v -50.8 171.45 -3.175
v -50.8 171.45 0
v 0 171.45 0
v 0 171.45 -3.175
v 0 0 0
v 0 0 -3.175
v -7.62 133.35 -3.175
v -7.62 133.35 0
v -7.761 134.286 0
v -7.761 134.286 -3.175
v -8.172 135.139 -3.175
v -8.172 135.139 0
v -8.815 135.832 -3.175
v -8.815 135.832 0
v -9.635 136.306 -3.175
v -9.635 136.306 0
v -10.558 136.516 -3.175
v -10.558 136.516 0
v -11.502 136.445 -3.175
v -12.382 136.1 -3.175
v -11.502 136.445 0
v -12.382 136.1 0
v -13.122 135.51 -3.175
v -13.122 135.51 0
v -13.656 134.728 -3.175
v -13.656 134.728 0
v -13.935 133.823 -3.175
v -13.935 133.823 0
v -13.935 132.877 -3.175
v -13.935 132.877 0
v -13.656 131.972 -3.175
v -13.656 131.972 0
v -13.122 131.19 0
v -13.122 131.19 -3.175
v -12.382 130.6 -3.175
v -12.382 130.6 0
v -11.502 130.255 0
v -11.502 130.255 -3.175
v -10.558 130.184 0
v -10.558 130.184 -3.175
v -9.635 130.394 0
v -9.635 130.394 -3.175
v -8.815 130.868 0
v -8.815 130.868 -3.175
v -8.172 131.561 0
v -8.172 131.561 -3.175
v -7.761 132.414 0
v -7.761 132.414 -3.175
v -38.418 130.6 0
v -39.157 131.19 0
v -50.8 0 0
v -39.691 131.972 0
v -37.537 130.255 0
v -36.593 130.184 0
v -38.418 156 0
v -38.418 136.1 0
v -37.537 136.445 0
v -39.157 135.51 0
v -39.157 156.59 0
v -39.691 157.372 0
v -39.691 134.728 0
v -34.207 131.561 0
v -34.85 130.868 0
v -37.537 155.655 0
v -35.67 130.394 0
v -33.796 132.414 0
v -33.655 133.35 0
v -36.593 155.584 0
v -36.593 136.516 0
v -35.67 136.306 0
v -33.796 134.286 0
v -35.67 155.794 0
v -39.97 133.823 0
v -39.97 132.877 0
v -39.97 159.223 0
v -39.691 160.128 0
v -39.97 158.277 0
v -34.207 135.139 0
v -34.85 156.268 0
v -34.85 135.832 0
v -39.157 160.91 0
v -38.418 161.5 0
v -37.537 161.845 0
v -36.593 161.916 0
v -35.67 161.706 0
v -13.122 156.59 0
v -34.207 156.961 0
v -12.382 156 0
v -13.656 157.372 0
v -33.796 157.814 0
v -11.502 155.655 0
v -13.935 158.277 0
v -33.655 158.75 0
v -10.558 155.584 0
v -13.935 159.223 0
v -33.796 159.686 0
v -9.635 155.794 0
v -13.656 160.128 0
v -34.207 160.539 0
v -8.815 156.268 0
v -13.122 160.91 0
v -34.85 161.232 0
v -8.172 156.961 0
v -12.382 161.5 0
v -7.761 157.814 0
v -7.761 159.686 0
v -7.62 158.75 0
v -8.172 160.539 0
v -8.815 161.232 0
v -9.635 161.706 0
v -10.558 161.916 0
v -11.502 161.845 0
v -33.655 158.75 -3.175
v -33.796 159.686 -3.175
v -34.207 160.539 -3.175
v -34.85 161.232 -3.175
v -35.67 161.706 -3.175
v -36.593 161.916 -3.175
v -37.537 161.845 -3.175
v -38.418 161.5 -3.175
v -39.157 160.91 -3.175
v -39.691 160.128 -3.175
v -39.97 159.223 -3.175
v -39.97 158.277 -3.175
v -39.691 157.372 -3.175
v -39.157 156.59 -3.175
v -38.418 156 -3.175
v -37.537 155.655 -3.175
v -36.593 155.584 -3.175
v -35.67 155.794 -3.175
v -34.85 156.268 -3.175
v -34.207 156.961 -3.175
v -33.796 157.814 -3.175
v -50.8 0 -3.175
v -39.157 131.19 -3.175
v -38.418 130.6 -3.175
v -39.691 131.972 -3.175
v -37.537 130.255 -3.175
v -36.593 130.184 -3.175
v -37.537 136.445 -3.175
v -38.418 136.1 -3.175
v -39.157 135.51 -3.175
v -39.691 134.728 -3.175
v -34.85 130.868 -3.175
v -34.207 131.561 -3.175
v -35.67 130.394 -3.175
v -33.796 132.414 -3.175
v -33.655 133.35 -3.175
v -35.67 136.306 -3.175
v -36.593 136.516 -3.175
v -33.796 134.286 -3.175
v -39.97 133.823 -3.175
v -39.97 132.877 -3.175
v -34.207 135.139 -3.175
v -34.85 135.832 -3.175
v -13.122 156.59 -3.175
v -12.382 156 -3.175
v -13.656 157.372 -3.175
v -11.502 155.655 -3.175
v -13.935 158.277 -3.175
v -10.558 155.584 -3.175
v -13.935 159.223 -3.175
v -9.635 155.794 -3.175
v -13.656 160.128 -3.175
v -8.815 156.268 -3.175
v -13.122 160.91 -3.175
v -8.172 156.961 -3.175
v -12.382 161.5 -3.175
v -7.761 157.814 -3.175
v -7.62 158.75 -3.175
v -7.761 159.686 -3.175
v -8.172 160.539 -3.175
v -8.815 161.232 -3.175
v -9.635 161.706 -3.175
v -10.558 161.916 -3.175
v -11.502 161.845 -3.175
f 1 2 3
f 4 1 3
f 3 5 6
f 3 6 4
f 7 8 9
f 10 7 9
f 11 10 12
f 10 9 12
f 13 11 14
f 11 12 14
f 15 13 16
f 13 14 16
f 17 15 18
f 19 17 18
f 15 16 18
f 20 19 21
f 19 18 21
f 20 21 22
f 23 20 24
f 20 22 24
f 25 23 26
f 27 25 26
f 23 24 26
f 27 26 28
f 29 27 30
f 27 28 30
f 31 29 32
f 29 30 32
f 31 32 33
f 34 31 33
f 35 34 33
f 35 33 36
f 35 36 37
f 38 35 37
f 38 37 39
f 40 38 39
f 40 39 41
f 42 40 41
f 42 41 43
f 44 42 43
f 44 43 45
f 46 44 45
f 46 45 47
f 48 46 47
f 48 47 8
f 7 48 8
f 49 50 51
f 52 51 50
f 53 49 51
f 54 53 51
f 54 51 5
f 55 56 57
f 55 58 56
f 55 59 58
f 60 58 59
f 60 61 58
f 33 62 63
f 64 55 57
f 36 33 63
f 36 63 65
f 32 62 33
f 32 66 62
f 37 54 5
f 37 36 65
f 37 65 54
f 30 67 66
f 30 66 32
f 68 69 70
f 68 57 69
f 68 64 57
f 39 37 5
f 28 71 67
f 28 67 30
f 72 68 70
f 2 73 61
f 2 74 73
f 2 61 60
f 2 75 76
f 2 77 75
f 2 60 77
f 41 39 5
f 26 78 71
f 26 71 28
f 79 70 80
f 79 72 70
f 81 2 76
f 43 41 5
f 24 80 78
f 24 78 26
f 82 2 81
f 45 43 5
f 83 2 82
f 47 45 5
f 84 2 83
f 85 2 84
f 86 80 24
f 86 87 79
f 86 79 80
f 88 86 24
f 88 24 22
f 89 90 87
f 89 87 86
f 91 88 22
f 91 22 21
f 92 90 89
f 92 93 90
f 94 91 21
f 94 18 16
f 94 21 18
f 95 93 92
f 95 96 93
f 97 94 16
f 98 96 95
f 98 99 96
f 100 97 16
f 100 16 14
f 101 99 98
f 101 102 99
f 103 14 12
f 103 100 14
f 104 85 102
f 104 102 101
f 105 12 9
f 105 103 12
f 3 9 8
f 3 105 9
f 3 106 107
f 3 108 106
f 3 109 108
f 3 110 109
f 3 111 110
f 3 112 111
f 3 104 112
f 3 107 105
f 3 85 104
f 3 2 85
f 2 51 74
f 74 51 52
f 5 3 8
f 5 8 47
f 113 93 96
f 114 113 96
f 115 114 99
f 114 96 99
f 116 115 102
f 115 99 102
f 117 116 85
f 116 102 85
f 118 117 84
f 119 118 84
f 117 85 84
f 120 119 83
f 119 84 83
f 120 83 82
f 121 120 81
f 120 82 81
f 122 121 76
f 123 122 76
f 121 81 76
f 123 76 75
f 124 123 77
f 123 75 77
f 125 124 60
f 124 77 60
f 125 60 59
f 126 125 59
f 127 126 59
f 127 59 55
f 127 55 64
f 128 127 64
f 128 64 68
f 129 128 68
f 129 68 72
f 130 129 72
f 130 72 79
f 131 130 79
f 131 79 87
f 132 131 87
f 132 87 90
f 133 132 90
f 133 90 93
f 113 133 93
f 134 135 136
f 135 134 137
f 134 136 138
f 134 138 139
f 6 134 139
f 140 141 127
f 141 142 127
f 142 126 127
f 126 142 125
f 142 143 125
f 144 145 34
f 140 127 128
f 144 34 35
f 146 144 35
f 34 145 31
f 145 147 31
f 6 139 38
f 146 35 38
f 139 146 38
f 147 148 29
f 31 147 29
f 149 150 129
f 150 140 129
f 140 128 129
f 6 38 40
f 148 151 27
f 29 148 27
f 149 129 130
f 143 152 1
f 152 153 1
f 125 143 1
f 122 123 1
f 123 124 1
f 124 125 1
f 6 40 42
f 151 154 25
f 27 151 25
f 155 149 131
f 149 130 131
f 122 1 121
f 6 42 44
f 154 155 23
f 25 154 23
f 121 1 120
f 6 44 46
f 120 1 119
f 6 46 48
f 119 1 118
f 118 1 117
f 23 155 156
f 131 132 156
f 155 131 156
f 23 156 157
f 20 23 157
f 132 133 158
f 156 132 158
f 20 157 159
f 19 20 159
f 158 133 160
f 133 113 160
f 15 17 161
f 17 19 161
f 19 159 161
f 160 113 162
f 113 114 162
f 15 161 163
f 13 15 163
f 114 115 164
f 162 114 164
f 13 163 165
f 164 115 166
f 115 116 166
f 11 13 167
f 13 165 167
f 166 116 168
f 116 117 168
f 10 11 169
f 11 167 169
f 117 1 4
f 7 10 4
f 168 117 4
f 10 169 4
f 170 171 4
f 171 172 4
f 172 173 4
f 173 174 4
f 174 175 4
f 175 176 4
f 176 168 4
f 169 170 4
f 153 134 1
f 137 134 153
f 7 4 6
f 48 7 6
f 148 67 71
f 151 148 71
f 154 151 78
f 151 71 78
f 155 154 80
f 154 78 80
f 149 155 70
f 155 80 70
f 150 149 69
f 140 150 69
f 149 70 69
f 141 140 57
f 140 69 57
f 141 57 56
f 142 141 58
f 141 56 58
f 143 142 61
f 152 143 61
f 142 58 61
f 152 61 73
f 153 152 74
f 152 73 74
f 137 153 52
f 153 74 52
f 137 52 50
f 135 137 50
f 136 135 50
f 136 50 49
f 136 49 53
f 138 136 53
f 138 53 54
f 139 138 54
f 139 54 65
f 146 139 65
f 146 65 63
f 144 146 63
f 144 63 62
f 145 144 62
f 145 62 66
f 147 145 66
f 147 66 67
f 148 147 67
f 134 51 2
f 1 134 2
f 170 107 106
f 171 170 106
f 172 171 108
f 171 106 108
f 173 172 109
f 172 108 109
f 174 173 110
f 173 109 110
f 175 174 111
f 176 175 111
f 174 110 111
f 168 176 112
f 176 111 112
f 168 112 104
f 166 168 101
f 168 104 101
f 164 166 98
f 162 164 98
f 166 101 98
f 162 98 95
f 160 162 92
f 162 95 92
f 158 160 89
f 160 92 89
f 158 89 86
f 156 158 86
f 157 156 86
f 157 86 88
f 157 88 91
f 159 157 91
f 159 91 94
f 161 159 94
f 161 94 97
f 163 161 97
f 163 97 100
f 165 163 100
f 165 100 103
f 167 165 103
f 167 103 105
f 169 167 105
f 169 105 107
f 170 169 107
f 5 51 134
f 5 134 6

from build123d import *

# Parameters (mm, degrees)
SKETCH1_W           = 50.8
SKETCH1_H           = 171.45
BOSS_EXTRUDE2_DEPTH = 3.175
SKETCH2_R           = 3.175
CUT_EXTRUDE1_DEPTH  = 179.84580824


with BuildPart() as part:
    # Sketch1 → Boss-Extrude2 (new body)
    with BuildSketch(Plane.XY):
        with Locations((-25.4, 85.725)):
            Rectangle(SKETCH1_W, SKETCH1_H)
    extrude(amount=-BOSS_EXTRUDE2_DEPTH)

    # Sketch2 → Cut-Extrude1 (cut, through all)
    with BuildSketch(Plane.XY):
        with Locations((-10.795, 158.75)):
            Circle(SKETCH2_R)
        with Locations((-36.83, 158.75)):
            Circle(SKETCH2_R)
        with Locations((-10.795, 133.35)):
            Circle(SKETCH2_R)
        with Locations((-36.83, 133.35)):
            Circle(SKETCH2_R)
    extrude(amount=-CUT_EXTRUDE1_DEPTH, mode=Mode.SUBTRACT)


solid = part.part
